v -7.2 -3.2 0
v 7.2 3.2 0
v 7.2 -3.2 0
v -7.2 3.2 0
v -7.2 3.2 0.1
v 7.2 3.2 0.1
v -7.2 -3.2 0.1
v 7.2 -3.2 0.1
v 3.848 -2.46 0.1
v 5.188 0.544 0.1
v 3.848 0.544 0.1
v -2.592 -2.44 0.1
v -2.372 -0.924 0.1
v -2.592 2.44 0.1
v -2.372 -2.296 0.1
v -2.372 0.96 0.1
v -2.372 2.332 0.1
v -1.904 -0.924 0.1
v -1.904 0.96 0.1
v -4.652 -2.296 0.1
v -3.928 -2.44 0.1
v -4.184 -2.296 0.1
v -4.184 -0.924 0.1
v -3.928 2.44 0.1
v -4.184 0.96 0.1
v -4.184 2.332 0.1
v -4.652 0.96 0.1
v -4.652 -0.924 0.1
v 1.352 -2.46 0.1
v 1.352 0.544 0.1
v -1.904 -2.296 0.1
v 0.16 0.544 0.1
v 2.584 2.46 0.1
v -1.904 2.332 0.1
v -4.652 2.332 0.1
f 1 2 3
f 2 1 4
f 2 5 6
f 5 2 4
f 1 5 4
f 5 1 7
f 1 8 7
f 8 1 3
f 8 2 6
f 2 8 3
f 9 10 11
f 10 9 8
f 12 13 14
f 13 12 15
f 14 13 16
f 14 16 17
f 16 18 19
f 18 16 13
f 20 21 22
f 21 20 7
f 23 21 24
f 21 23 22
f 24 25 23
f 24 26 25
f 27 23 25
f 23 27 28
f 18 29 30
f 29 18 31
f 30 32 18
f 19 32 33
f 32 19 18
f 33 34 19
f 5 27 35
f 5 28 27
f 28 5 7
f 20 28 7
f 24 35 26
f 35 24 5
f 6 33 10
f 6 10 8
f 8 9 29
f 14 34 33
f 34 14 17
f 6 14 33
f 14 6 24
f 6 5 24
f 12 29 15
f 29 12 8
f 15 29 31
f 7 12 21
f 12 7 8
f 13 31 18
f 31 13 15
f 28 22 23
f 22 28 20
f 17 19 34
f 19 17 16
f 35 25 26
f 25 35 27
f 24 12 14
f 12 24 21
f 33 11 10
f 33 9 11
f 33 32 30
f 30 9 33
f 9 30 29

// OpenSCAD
// file: ../p/box5-12.scad
use <../lib.scad>
function ldraw_lib__box5_12() = [
// 0 Box with 5 Faces without Any Edges
// 0 Name: box5-12.dat
// 0 Author: Chris Dee [cwdee]
// 0 !LDRAW_ORG Primitive UPDATE 2009-02
// 0 !LICENSE Licensed under CC BY 4.0 : see CAreadme.txt
// 
// 0 BFC CERTIFY CCW
  [0,"BFC","CERTIFY"],
  [0,"BFC","CCW"],
// 
// 0 !HISTORY 2009-09-03 [PTadmin] Official Update 2009-02
// 
// 
// 4 16 1 1 1 1 1 -1 -1 1 -1 -1 1 1
  [4,16,1,1,1,1,1,-1,-1,1,-1,-1,1,1],
// 4 16 -1 0 1 1 0 1 1 1 1 -1 1 1
  [4,16,-1,0,1,1,0,1,1,1,1,-1,1,1],
// 4 16 -1 0 -1 -1 0 1 -1 1 1 -1 1 -1
  [4,16,-1,0,-1,-1,0,1,-1,1,1,-1,1,-1],
// 4 16 1 0 -1 -1 0 -1 -1 1 -1 1 1 -1
  [4,16,1,0,-1,-1,0,-1,-1,1,-1,1,1,-1],
// 4 16 1 0 1 1 0 -1 1 1 -1 1 1 1
  [4,16,1,0,1,1,0,-1,1,1,-1,1,1,1],
// 0
];
module ldraw_lib__box5_12(step=0, col=false, unit=2/5, alt=false, line=0.2, solid=!$preview)
    makepoly(ldraw_lib__box5_12(), step=step, col=col, unit=unit, alt=alt, line=line, solid=solid);
ldraw_lib__box5_12(line=0.2);
// main file
use <../lib.scad>
use <../p/box5-12.scad>
function ldraw_lib__821577e() = [
// 0 Sticker  0.8 x  1.8 with Car and Red Straight Arrow Up
// 0 Name: 821577e.dat
// 0 Author: Evert-Jan Boer [ejboer]
// 0 !LDRAW_ORG Part UPDATE 2026-07
// 0 !LICENSE Licensed under CC BY 4.0 : see CAreadme.txt
// 
// 0 BFC CERTIFY CCW
  [0,"BFC","CERTIFY"],
  [0,"BFC","CCW"],
// 
// 0 !CATEGORY Sticker
// 0 !KEYWORDS Multi Control, Set 8082
// 
// 0 !HISTORY 2026-07-30 [OrionP] Official Update 2026-07
// 
// 1 16 0 -.25 0 18 0 0 0 0.25 0 0 0 8 box5-12.dat
  [1,16,0,-.25,0,18,0,0,0,0.25,0,0,0,8, ldraw_lib__box5_12()],
// 4 16 12.97 -.25 1.36 9.62 -.25 1.36 9.62 -.25 -6.15 18 -.25 -8
  [4,16,12.97,-.25,1.36,9.62,-.25,1.36,9.62,-.25,-6.15,18,-.25,-8],
// 4 16 -5.93 -.25 -5.74 -5.93 -.25 -2.31 -6.48 -.25 6.1 -6.48 -.25 -6.1
  [4,16,-5.93,-.25,-5.74,-5.93,-.25,-2.31,-6.48,-.25,6.1,-6.48,-.25,-6.1],
// 3 16 -6.48 -.25 6.1 -5.93 -.25 -2.31 -5.93 -.25 2.4
  [3,16,-6.48,-.25,6.1,-5.93,-.25,-2.31,-5.93,-.25,2.4],
// 3 16 -6.48 -.25 6.1 -5.93 -.25 2.4 -5.93 -.25 5.83
  [3,16,-6.48,-.25,6.1,-5.93,-.25,2.4,-5.93,-.25,5.83],
// 4 16 -5.93 -.25 -2.31 -4.76 -.25 -2.31 -4.76 -.25 2.4 -5.93 -.25 2.4
  [4,16,-5.93,-.25,-2.31,-4.76,-.25,-2.31,-4.76,-.25,2.4,-5.93,-.25,2.4],
// 4 16 -9.82 -.25 -6.1 -10.46 -.25 -5.74 -11.63 -.25 -5.74 -18 -.25 -8
  [4,16,-9.82,-.25,-6.1,-10.46,-.25,-5.74,-11.63,-.25,-5.74,-18,-.25,-8],
// 4 16 -10.46 -.25 -5.74 -9.82 -.25 -6.1 -9.82 -.25 6.1 -10.46 -.25 -2.31
  [4,16,-10.46,-.25,-5.74,-9.82,-.25,-6.1,-9.82,-.25,6.1,-10.46,-.25,-2.31],
// 3 16 -9.82 -.25 6.1 -10.46 -.25 2.4 -10.46 -.25 -2.31
  [3,16,-9.82,-.25,6.1,-10.46,-.25,2.4,-10.46,-.25,-2.31],
// 3 16 -9.82 -.25 6.1 -10.46 -.25 5.83 -10.46 -.25 2.4
  [3,16,-9.82,-.25,6.1,-10.46,-.25,5.83,-10.46,-.25,2.4],
// 4 16 -10.46 -.25 2.4 -11.63 -.25 2.4 -11.63 -.25 -2.31 -10.46 -.25 -2.31
  [4,16,-10.46,-.25,2.4,-11.63,-.25,2.4,-11.63,-.25,-2.31,-10.46,-.25,-2.31],
// 4 16 3.38 -.25 -6.15 3.38 -.25 1.36 -4.76 -.25 -2.31 -4.76 -.25 -5.74
  [4,16,3.38,-.25,-6.15,3.38,-.25,1.36,-4.76,-.25,-2.31,-4.76,-.25,-5.74],
// 3 16 3.38 -.25 1.36 .4 -.25 1.36 -4.76 -.25 -2.31
  [3,16,3.38,-.25,1.36,.4,-.25,1.36,-4.76,-.25,-2.31],
// 4 16 -4.76 -.25 -2.31 .4 -.25 1.36 6.46 -.25 6.15 -4.76 -.25 2.4
  [4,16,-4.76,-.25,-2.31,.4,-.25,1.36,6.46,-.25,6.15,-4.76,-.25,2.4],
// 3 16 6.46 -.25 6.15 -4.76 -.25 5.83 -4.76 -.25 2.4
  [3,16,6.46,-.25,6.15,-4.76,-.25,5.83,-4.76,-.25,2.4],
// 3 16 -18 -.25 8 -11.63 -.25 2.4 -11.63 -.25 5.83
  [3,16,-18,-.25,8,-11.63,-.25,2.4,-11.63,-.25,5.83],
// 4 16 -11.63 -.25 -2.31 -11.63 -.25 2.4 -18 -.25 8 -18 -.25 -8
  [4,16,-11.63,-.25,-2.31,-11.63,-.25,2.4,-18,-.25,8,-18,-.25,-8],
// 3 16 -11.63 -.25 -5.74 -11.63 -.25 -2.31 -18 -.25 -8
  [3,16,-11.63,-.25,-5.74,-11.63,-.25,-2.31,-18,-.25,-8],
// 4 16 -10.46 -.25 5.83 -9.82 -.25 6.1 -18 -.25 8 -11.63 -.25 5.83
  [4,16,-10.46,-.25,5.83,-9.82,-.25,6.1,-18,-.25,8,-11.63,-.25,5.83],
// 3 16 18 -.25 8 6.46 -.25 6.15 12.97 -.25 1.36
  [3,16,18,-.25,8,6.46,-.25,6.15,12.97,-.25,1.36],
// 3 16 18 -.25 8 12.97 -.25 1.36 18 -.25 -8
  [3,16,18,-.25,8,12.97,-.25,1.36,18,-.25,-8],
// 3 16 18 -.25 -8 9.62 -.25 -6.15 3.38 -.25 -6.15
  [3,16,18,-.25,-8,9.62,-.25,-6.15,3.38,-.25,-6.15],
// 4 16 -6.48 -.25 6.1 -5.93 -.25 5.83 -4.76 -.25 5.83 6.46 -.25 6.15
  [4,16,-6.48,-.25,6.1,-5.93,-.25,5.83,-4.76,-.25,5.83,6.46,-.25,6.15],
// 4 16 -9.82 -.25 6.1 -6.48 -.25 6.1 6.46 -.25 6.15 18 -.25 8
  [4,16,-9.82,-.25,6.1,-6.48,-.25,6.1,6.46,-.25,6.15,18,-.25,8],
// 3 16 18 -.25 8 -18 -.25 8 -9.82 -.25 6.1
  [3,16,18,-.25,8,-18,-.25,8,-9.82,-.25,6.1],
// 4 16 18 -.25 -8 3.38 -.25 -6.15 -5.93 -.25 -5.74 -6.48 -.25 -6.1
  [4,16,18,-.25,-8,3.38,-.25,-6.15,-5.93,-.25,-5.74,-6.48,-.25,-6.1],
// 3 16 -5.93 -.25 -5.74 3.38 -.25 -6.15 -4.76 -.25 -5.74
  [3,16,-5.93,-.25,-5.74,3.38,-.25,-6.15,-4.76,-.25,-5.74],
// 4 16 -18 -.25 -8 18 -.25 -8 -6.48 -.25 -6.1 -9.82 -.25 -6.1
  [4,16,-18,-.25,-8,18,-.25,-8,-6.48,-.25,-6.1,-9.82,-.25,-6.1],
// 
// 0 BFC NOCLIP
  [0,"BFC","NOCLIP"],
// 
// 4 14 -5.93 -.25 -2.31 -5.93 -.25 -5.74 -4.76 -.25 -5.74 -4.76 -.25 -2.31
  [4,14,-5.93,-.25,-2.31,-5.93,-.25,-5.74,-4.76,-.25,-5.74,-4.76,-.25,-2.31],
// 4 14 -11.63 -.25 -2.31 -11.63 -.25 -5.74 -10.46 -.25 -5.74 -10.46 -.25 -2.31
  [4,14,-11.63,-.25,-2.31,-11.63,-.25,-5.74,-10.46,-.25,-5.74,-10.46,-.25,-2.31],
// 4 14 -5.93 -.25 5.83 -5.93 -.25 2.4 -4.76 -.25 2.4 -4.76 -.25 5.83
  [4,14,-5.93,-.25,5.83,-5.93,-.25,2.4,-4.76,-.25,2.4,-4.76,-.25,5.83],
// 4 14 -11.63 -.25 5.83 -11.63 -.25 2.4 -10.46 -.25 2.4 -10.46 -.25 5.83
  [4,14,-11.63,-.25,5.83,-11.63,-.25,2.4,-10.46,-.25,2.4,-10.46,-.25,5.83],
// 4 0 -9.82 -.25 6.1 -9.82 -.25 -6.1 -6.48 -.25 -6.1 -6.48 -.25 6.1
  [4,0,-9.82,-.25,6.1,-9.82,-.25,-6.1,-6.48,-.25,-6.1,-6.48,-.25,6.1],
// 3 4 6.46 -.25 6.15 9.62 -.25 1.36 12.97 -.25 1.36
  [3,4,6.46,-.25,6.15,9.62,-.25,1.36,12.97,-.25,1.36],
// 3 4 6.46 -.25 6.15 9.62 -.25 -6.15 9.62 -.25 1.36
  [3,4,6.46,-.25,6.15,9.62,-.25,-6.15,9.62,-.25,1.36],
// 3 4 6.46 -.25 6.15 .4 -.25 1.36 3.38 -.25 1.36
  [3,4,6.46,-.25,6.15,.4,-.25,1.36,3.38,-.25,1.36],
// 4 4 6.46 -.25 6.15 3.38 -.25 1.36 3.38 -.25 -6.15 9.62 -.25 -6.15
  [4,4,6.46,-.25,6.15,3.38,-.25,1.36,3.38,-.25,-6.15,9.62,-.25,-6.15],
];
module ldraw_lib__821577e(step=0, col=false, unit=2/5, alt=false, line=0.2, solid=!$preview)
    makepoly(ldraw_lib__821577e(), step=step, col=col, unit=unit, alt=alt, line=line, solid=solid);
ldraw_lib__821577e(line=0.2);
